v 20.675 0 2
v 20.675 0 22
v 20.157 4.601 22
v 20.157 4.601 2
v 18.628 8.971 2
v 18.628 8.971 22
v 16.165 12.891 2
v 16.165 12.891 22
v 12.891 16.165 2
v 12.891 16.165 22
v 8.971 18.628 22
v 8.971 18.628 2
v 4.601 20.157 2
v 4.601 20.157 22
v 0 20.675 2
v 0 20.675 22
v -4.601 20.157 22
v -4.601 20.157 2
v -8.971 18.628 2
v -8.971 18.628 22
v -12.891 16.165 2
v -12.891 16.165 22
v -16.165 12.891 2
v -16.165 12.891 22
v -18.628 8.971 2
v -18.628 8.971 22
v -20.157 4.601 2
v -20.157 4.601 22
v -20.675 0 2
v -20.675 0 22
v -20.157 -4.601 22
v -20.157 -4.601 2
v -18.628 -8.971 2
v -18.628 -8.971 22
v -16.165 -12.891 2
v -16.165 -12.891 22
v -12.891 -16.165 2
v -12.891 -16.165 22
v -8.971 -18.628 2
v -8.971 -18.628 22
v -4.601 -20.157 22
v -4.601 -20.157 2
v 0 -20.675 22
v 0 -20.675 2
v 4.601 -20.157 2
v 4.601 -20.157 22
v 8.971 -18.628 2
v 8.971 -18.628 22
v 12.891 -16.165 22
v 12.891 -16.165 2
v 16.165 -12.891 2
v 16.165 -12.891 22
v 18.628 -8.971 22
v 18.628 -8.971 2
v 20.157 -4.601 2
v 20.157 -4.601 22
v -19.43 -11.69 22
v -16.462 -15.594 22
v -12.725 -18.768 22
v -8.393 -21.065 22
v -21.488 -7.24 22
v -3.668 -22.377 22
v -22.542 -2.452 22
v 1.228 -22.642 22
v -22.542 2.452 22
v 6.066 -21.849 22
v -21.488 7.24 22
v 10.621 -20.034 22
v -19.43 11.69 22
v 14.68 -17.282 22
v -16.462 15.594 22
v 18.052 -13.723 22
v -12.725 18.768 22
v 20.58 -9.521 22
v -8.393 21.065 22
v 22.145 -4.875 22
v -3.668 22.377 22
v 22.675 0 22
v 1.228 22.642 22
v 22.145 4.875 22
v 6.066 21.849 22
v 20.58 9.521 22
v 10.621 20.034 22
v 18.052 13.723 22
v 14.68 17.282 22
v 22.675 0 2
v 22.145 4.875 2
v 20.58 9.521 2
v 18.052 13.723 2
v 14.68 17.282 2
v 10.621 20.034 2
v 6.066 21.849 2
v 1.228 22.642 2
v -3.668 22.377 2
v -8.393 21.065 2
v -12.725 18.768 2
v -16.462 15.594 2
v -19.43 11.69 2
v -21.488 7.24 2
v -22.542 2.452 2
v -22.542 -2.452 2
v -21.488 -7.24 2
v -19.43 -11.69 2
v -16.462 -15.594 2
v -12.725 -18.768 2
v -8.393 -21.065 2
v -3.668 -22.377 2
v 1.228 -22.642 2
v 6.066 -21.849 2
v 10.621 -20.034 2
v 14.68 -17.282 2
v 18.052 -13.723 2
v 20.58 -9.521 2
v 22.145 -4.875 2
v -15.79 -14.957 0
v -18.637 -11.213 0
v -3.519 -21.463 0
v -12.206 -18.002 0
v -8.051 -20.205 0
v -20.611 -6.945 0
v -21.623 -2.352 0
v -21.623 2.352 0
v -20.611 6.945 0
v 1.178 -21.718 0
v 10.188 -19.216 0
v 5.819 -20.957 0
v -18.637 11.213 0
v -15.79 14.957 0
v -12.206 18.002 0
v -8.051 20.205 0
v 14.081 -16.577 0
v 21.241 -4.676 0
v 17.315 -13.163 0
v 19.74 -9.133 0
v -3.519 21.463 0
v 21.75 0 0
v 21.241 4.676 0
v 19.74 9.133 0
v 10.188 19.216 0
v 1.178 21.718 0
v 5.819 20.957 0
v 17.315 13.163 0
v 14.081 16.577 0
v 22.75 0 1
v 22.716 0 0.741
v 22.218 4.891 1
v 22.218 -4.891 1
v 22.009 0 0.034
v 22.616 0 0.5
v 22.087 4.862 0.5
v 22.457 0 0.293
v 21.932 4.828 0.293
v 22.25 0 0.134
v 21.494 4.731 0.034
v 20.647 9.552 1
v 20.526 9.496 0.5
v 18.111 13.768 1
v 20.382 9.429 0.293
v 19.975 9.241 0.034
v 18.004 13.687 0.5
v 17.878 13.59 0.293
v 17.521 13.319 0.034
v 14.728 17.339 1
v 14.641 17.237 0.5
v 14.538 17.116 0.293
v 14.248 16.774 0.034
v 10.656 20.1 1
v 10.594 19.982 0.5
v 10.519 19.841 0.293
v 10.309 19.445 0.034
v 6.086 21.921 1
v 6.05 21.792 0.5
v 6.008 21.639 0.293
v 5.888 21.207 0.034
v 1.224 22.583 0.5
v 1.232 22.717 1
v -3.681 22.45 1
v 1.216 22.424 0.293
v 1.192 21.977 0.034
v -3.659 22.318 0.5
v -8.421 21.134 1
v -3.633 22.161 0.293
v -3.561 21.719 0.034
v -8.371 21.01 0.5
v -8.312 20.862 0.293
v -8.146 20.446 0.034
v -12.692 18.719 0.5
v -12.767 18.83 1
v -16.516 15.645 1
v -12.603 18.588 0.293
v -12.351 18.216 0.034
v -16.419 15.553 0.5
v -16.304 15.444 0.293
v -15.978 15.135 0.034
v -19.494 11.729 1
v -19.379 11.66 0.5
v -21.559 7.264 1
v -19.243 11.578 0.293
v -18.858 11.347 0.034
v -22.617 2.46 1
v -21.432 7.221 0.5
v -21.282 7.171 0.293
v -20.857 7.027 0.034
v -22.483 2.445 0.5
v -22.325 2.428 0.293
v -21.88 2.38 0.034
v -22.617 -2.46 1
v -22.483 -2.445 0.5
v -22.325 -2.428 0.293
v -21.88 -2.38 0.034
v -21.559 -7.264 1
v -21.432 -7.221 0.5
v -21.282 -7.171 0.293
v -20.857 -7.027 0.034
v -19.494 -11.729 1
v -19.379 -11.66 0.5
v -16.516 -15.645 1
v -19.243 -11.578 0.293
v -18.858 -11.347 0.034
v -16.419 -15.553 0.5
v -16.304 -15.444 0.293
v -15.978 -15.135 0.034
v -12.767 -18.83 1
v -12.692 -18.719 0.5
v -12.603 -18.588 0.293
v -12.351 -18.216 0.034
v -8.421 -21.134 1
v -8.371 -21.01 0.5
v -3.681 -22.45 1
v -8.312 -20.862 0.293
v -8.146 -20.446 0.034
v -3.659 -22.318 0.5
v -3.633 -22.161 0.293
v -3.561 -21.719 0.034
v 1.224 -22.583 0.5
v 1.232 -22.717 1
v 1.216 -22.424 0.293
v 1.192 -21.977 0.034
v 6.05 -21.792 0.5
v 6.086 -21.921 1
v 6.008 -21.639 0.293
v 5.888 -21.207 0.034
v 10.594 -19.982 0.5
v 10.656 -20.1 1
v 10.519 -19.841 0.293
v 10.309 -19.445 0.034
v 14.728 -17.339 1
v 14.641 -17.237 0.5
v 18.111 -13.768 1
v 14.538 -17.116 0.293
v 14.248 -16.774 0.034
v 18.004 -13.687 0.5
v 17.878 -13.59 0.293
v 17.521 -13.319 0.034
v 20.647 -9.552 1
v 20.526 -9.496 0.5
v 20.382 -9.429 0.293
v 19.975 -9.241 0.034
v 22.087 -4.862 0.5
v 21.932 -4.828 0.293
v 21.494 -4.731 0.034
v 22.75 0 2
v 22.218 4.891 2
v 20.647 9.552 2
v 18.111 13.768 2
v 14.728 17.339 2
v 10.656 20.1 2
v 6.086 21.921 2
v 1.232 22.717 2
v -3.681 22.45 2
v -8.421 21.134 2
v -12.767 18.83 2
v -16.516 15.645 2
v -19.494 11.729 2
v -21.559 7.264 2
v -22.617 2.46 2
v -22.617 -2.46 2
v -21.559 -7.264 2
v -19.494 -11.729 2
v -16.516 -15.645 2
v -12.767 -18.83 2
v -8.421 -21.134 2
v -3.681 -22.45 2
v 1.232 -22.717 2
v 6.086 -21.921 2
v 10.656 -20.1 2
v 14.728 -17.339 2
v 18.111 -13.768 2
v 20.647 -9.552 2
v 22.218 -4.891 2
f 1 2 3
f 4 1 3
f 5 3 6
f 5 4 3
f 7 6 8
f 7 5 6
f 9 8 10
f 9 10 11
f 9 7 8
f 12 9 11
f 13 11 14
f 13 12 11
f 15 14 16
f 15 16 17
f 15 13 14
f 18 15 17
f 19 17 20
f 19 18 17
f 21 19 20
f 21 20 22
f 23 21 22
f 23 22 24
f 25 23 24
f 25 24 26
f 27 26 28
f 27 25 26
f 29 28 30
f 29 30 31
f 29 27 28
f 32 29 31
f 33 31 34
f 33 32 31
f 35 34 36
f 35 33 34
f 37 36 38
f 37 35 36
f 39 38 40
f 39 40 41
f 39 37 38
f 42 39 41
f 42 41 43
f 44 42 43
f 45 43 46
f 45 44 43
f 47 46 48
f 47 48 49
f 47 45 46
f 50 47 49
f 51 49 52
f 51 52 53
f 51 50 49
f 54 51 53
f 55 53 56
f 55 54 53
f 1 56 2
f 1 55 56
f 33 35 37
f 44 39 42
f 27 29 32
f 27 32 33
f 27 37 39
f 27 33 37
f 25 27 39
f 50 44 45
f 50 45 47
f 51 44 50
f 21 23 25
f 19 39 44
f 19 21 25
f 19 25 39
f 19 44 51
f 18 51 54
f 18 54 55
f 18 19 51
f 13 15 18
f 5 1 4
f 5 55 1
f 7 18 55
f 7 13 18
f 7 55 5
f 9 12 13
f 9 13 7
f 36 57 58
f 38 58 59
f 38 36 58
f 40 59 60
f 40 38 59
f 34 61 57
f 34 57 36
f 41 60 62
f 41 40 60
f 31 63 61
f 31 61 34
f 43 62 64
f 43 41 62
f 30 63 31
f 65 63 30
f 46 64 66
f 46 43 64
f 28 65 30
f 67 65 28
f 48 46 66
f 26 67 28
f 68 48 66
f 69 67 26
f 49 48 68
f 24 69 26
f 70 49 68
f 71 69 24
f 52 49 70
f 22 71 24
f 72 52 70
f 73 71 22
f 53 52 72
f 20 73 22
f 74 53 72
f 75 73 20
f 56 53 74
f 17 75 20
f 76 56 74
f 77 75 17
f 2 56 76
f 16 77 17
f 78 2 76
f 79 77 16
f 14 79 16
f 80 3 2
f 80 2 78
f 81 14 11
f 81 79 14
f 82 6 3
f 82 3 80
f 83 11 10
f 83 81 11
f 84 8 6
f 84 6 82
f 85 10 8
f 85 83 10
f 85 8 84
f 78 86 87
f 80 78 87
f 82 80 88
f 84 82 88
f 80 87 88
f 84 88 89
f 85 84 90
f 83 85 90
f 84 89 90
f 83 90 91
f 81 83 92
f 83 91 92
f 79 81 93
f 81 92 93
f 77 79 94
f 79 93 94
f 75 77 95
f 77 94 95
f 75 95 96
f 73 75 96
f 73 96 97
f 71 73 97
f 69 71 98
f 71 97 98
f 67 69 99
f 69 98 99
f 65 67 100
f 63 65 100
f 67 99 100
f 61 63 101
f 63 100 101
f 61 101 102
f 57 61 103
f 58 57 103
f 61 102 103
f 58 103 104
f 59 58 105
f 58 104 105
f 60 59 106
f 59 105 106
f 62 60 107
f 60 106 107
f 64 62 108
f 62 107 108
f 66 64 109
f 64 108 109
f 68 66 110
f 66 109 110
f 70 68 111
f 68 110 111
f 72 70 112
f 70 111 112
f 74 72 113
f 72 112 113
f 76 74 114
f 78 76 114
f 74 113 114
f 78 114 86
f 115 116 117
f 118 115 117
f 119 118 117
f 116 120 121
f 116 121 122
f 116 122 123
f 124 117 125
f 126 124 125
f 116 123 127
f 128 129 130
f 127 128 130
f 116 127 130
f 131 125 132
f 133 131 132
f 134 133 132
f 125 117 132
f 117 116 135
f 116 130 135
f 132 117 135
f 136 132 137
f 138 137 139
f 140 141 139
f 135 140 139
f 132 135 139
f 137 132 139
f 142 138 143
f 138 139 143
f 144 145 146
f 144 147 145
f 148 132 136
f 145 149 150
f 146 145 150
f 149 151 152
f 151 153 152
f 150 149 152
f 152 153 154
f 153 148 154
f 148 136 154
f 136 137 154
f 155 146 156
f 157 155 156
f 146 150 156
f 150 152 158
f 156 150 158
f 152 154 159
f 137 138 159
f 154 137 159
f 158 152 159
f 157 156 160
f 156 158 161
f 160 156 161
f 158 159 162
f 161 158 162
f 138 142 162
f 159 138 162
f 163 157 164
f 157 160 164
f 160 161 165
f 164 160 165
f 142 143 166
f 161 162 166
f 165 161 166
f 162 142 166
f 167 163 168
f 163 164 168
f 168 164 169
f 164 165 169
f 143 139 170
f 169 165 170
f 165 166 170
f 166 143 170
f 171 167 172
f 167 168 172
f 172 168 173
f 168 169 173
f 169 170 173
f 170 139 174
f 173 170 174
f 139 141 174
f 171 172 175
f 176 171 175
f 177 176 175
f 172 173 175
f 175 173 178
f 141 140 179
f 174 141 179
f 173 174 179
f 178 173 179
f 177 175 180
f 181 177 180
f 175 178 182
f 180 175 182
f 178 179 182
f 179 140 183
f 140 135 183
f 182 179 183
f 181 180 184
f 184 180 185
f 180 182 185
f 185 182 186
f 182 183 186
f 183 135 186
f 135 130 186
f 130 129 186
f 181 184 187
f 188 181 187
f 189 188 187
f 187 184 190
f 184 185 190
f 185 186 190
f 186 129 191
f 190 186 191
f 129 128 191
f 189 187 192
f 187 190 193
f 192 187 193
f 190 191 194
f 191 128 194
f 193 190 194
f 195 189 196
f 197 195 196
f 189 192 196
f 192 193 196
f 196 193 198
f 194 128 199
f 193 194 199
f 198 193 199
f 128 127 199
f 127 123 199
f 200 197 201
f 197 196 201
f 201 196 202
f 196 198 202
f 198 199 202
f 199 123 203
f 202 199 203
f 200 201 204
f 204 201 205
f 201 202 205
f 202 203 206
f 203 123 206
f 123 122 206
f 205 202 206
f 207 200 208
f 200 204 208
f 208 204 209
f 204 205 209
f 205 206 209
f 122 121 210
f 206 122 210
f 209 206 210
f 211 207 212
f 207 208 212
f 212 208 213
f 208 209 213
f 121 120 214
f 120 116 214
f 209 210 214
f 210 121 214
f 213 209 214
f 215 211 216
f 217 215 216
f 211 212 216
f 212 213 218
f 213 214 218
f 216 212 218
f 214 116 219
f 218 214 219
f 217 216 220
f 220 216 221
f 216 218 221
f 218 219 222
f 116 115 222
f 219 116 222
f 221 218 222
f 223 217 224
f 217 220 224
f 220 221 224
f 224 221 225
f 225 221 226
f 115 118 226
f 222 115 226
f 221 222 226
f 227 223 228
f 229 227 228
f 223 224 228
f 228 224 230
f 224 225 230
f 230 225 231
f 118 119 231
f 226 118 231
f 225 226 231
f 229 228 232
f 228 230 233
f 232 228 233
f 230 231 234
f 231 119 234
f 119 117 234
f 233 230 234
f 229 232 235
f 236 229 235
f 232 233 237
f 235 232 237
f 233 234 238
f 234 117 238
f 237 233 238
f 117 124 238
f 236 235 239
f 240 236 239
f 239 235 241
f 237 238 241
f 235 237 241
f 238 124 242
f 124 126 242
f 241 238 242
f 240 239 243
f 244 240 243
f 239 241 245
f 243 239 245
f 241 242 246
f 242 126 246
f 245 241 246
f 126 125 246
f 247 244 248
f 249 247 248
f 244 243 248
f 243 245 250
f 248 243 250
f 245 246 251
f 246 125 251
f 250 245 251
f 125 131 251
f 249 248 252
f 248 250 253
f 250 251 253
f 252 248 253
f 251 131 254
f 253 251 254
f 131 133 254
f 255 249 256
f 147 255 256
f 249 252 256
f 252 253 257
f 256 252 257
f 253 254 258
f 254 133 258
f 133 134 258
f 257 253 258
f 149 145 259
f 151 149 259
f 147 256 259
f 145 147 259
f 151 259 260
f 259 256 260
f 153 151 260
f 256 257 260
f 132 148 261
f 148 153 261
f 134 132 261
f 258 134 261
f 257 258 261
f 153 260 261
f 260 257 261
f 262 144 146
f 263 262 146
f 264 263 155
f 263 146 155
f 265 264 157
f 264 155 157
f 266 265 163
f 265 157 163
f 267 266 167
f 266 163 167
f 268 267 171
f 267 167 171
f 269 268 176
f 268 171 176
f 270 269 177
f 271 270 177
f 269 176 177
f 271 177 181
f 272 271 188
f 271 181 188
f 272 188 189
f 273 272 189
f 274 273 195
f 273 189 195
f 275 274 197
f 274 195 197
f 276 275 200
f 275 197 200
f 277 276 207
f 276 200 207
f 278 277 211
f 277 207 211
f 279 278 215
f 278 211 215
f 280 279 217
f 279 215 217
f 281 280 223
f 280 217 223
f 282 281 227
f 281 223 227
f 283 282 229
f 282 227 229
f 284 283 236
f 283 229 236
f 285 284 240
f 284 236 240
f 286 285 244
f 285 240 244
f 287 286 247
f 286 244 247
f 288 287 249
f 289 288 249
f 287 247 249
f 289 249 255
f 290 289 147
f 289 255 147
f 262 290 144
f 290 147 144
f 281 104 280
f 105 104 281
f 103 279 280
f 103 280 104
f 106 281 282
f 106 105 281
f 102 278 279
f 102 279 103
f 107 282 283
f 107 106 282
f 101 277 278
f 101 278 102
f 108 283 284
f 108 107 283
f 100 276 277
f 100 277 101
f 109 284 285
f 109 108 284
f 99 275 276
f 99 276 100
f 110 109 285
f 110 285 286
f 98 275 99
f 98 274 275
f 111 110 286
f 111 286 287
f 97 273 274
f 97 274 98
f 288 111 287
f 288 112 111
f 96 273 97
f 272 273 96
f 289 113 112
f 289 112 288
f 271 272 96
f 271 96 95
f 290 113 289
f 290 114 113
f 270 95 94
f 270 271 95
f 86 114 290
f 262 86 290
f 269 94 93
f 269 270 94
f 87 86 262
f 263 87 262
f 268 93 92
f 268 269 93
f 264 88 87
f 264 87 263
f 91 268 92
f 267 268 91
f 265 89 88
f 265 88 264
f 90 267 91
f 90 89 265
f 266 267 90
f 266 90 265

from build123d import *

# Parameters (mm, degrees)
SKETCH1_R           = 22.75
BOSS_EXTRUDE1_DEPTH = 2
SKETCH2_R           = 22.675423682
SKETCH2_R_2         = 20.675423682
BOSS_EXTRUDE2_DEPTH = 20
FILLET1_R           = 1


with BuildPart() as part:
    # Sketch1 → Boss-Extrude1 (new body)
    with BuildSketch(Plane.XY):
        Circle(SKETCH1_R)
    extrude(amount=BOSS_EXTRUDE1_DEPTH)

    # Sketch2 → Boss-Extrude2 (add)
    with BuildSketch(Plane.XY.offset(2)):
        Circle(SKETCH2_R)
        Circle(SKETCH2_R_2, mode=Mode.SUBTRACT)
    extrude(amount=BOSS_EXTRUDE2_DEPTH)

    # Fillet1
    fillet1_edges = [part.edges().sort_by_distance(p)[0] for p in [
        (-22.75, 0, 0),
    ]]
    fillet(fillet1_edges, radius=FILLET1_R)


solid = part.part
